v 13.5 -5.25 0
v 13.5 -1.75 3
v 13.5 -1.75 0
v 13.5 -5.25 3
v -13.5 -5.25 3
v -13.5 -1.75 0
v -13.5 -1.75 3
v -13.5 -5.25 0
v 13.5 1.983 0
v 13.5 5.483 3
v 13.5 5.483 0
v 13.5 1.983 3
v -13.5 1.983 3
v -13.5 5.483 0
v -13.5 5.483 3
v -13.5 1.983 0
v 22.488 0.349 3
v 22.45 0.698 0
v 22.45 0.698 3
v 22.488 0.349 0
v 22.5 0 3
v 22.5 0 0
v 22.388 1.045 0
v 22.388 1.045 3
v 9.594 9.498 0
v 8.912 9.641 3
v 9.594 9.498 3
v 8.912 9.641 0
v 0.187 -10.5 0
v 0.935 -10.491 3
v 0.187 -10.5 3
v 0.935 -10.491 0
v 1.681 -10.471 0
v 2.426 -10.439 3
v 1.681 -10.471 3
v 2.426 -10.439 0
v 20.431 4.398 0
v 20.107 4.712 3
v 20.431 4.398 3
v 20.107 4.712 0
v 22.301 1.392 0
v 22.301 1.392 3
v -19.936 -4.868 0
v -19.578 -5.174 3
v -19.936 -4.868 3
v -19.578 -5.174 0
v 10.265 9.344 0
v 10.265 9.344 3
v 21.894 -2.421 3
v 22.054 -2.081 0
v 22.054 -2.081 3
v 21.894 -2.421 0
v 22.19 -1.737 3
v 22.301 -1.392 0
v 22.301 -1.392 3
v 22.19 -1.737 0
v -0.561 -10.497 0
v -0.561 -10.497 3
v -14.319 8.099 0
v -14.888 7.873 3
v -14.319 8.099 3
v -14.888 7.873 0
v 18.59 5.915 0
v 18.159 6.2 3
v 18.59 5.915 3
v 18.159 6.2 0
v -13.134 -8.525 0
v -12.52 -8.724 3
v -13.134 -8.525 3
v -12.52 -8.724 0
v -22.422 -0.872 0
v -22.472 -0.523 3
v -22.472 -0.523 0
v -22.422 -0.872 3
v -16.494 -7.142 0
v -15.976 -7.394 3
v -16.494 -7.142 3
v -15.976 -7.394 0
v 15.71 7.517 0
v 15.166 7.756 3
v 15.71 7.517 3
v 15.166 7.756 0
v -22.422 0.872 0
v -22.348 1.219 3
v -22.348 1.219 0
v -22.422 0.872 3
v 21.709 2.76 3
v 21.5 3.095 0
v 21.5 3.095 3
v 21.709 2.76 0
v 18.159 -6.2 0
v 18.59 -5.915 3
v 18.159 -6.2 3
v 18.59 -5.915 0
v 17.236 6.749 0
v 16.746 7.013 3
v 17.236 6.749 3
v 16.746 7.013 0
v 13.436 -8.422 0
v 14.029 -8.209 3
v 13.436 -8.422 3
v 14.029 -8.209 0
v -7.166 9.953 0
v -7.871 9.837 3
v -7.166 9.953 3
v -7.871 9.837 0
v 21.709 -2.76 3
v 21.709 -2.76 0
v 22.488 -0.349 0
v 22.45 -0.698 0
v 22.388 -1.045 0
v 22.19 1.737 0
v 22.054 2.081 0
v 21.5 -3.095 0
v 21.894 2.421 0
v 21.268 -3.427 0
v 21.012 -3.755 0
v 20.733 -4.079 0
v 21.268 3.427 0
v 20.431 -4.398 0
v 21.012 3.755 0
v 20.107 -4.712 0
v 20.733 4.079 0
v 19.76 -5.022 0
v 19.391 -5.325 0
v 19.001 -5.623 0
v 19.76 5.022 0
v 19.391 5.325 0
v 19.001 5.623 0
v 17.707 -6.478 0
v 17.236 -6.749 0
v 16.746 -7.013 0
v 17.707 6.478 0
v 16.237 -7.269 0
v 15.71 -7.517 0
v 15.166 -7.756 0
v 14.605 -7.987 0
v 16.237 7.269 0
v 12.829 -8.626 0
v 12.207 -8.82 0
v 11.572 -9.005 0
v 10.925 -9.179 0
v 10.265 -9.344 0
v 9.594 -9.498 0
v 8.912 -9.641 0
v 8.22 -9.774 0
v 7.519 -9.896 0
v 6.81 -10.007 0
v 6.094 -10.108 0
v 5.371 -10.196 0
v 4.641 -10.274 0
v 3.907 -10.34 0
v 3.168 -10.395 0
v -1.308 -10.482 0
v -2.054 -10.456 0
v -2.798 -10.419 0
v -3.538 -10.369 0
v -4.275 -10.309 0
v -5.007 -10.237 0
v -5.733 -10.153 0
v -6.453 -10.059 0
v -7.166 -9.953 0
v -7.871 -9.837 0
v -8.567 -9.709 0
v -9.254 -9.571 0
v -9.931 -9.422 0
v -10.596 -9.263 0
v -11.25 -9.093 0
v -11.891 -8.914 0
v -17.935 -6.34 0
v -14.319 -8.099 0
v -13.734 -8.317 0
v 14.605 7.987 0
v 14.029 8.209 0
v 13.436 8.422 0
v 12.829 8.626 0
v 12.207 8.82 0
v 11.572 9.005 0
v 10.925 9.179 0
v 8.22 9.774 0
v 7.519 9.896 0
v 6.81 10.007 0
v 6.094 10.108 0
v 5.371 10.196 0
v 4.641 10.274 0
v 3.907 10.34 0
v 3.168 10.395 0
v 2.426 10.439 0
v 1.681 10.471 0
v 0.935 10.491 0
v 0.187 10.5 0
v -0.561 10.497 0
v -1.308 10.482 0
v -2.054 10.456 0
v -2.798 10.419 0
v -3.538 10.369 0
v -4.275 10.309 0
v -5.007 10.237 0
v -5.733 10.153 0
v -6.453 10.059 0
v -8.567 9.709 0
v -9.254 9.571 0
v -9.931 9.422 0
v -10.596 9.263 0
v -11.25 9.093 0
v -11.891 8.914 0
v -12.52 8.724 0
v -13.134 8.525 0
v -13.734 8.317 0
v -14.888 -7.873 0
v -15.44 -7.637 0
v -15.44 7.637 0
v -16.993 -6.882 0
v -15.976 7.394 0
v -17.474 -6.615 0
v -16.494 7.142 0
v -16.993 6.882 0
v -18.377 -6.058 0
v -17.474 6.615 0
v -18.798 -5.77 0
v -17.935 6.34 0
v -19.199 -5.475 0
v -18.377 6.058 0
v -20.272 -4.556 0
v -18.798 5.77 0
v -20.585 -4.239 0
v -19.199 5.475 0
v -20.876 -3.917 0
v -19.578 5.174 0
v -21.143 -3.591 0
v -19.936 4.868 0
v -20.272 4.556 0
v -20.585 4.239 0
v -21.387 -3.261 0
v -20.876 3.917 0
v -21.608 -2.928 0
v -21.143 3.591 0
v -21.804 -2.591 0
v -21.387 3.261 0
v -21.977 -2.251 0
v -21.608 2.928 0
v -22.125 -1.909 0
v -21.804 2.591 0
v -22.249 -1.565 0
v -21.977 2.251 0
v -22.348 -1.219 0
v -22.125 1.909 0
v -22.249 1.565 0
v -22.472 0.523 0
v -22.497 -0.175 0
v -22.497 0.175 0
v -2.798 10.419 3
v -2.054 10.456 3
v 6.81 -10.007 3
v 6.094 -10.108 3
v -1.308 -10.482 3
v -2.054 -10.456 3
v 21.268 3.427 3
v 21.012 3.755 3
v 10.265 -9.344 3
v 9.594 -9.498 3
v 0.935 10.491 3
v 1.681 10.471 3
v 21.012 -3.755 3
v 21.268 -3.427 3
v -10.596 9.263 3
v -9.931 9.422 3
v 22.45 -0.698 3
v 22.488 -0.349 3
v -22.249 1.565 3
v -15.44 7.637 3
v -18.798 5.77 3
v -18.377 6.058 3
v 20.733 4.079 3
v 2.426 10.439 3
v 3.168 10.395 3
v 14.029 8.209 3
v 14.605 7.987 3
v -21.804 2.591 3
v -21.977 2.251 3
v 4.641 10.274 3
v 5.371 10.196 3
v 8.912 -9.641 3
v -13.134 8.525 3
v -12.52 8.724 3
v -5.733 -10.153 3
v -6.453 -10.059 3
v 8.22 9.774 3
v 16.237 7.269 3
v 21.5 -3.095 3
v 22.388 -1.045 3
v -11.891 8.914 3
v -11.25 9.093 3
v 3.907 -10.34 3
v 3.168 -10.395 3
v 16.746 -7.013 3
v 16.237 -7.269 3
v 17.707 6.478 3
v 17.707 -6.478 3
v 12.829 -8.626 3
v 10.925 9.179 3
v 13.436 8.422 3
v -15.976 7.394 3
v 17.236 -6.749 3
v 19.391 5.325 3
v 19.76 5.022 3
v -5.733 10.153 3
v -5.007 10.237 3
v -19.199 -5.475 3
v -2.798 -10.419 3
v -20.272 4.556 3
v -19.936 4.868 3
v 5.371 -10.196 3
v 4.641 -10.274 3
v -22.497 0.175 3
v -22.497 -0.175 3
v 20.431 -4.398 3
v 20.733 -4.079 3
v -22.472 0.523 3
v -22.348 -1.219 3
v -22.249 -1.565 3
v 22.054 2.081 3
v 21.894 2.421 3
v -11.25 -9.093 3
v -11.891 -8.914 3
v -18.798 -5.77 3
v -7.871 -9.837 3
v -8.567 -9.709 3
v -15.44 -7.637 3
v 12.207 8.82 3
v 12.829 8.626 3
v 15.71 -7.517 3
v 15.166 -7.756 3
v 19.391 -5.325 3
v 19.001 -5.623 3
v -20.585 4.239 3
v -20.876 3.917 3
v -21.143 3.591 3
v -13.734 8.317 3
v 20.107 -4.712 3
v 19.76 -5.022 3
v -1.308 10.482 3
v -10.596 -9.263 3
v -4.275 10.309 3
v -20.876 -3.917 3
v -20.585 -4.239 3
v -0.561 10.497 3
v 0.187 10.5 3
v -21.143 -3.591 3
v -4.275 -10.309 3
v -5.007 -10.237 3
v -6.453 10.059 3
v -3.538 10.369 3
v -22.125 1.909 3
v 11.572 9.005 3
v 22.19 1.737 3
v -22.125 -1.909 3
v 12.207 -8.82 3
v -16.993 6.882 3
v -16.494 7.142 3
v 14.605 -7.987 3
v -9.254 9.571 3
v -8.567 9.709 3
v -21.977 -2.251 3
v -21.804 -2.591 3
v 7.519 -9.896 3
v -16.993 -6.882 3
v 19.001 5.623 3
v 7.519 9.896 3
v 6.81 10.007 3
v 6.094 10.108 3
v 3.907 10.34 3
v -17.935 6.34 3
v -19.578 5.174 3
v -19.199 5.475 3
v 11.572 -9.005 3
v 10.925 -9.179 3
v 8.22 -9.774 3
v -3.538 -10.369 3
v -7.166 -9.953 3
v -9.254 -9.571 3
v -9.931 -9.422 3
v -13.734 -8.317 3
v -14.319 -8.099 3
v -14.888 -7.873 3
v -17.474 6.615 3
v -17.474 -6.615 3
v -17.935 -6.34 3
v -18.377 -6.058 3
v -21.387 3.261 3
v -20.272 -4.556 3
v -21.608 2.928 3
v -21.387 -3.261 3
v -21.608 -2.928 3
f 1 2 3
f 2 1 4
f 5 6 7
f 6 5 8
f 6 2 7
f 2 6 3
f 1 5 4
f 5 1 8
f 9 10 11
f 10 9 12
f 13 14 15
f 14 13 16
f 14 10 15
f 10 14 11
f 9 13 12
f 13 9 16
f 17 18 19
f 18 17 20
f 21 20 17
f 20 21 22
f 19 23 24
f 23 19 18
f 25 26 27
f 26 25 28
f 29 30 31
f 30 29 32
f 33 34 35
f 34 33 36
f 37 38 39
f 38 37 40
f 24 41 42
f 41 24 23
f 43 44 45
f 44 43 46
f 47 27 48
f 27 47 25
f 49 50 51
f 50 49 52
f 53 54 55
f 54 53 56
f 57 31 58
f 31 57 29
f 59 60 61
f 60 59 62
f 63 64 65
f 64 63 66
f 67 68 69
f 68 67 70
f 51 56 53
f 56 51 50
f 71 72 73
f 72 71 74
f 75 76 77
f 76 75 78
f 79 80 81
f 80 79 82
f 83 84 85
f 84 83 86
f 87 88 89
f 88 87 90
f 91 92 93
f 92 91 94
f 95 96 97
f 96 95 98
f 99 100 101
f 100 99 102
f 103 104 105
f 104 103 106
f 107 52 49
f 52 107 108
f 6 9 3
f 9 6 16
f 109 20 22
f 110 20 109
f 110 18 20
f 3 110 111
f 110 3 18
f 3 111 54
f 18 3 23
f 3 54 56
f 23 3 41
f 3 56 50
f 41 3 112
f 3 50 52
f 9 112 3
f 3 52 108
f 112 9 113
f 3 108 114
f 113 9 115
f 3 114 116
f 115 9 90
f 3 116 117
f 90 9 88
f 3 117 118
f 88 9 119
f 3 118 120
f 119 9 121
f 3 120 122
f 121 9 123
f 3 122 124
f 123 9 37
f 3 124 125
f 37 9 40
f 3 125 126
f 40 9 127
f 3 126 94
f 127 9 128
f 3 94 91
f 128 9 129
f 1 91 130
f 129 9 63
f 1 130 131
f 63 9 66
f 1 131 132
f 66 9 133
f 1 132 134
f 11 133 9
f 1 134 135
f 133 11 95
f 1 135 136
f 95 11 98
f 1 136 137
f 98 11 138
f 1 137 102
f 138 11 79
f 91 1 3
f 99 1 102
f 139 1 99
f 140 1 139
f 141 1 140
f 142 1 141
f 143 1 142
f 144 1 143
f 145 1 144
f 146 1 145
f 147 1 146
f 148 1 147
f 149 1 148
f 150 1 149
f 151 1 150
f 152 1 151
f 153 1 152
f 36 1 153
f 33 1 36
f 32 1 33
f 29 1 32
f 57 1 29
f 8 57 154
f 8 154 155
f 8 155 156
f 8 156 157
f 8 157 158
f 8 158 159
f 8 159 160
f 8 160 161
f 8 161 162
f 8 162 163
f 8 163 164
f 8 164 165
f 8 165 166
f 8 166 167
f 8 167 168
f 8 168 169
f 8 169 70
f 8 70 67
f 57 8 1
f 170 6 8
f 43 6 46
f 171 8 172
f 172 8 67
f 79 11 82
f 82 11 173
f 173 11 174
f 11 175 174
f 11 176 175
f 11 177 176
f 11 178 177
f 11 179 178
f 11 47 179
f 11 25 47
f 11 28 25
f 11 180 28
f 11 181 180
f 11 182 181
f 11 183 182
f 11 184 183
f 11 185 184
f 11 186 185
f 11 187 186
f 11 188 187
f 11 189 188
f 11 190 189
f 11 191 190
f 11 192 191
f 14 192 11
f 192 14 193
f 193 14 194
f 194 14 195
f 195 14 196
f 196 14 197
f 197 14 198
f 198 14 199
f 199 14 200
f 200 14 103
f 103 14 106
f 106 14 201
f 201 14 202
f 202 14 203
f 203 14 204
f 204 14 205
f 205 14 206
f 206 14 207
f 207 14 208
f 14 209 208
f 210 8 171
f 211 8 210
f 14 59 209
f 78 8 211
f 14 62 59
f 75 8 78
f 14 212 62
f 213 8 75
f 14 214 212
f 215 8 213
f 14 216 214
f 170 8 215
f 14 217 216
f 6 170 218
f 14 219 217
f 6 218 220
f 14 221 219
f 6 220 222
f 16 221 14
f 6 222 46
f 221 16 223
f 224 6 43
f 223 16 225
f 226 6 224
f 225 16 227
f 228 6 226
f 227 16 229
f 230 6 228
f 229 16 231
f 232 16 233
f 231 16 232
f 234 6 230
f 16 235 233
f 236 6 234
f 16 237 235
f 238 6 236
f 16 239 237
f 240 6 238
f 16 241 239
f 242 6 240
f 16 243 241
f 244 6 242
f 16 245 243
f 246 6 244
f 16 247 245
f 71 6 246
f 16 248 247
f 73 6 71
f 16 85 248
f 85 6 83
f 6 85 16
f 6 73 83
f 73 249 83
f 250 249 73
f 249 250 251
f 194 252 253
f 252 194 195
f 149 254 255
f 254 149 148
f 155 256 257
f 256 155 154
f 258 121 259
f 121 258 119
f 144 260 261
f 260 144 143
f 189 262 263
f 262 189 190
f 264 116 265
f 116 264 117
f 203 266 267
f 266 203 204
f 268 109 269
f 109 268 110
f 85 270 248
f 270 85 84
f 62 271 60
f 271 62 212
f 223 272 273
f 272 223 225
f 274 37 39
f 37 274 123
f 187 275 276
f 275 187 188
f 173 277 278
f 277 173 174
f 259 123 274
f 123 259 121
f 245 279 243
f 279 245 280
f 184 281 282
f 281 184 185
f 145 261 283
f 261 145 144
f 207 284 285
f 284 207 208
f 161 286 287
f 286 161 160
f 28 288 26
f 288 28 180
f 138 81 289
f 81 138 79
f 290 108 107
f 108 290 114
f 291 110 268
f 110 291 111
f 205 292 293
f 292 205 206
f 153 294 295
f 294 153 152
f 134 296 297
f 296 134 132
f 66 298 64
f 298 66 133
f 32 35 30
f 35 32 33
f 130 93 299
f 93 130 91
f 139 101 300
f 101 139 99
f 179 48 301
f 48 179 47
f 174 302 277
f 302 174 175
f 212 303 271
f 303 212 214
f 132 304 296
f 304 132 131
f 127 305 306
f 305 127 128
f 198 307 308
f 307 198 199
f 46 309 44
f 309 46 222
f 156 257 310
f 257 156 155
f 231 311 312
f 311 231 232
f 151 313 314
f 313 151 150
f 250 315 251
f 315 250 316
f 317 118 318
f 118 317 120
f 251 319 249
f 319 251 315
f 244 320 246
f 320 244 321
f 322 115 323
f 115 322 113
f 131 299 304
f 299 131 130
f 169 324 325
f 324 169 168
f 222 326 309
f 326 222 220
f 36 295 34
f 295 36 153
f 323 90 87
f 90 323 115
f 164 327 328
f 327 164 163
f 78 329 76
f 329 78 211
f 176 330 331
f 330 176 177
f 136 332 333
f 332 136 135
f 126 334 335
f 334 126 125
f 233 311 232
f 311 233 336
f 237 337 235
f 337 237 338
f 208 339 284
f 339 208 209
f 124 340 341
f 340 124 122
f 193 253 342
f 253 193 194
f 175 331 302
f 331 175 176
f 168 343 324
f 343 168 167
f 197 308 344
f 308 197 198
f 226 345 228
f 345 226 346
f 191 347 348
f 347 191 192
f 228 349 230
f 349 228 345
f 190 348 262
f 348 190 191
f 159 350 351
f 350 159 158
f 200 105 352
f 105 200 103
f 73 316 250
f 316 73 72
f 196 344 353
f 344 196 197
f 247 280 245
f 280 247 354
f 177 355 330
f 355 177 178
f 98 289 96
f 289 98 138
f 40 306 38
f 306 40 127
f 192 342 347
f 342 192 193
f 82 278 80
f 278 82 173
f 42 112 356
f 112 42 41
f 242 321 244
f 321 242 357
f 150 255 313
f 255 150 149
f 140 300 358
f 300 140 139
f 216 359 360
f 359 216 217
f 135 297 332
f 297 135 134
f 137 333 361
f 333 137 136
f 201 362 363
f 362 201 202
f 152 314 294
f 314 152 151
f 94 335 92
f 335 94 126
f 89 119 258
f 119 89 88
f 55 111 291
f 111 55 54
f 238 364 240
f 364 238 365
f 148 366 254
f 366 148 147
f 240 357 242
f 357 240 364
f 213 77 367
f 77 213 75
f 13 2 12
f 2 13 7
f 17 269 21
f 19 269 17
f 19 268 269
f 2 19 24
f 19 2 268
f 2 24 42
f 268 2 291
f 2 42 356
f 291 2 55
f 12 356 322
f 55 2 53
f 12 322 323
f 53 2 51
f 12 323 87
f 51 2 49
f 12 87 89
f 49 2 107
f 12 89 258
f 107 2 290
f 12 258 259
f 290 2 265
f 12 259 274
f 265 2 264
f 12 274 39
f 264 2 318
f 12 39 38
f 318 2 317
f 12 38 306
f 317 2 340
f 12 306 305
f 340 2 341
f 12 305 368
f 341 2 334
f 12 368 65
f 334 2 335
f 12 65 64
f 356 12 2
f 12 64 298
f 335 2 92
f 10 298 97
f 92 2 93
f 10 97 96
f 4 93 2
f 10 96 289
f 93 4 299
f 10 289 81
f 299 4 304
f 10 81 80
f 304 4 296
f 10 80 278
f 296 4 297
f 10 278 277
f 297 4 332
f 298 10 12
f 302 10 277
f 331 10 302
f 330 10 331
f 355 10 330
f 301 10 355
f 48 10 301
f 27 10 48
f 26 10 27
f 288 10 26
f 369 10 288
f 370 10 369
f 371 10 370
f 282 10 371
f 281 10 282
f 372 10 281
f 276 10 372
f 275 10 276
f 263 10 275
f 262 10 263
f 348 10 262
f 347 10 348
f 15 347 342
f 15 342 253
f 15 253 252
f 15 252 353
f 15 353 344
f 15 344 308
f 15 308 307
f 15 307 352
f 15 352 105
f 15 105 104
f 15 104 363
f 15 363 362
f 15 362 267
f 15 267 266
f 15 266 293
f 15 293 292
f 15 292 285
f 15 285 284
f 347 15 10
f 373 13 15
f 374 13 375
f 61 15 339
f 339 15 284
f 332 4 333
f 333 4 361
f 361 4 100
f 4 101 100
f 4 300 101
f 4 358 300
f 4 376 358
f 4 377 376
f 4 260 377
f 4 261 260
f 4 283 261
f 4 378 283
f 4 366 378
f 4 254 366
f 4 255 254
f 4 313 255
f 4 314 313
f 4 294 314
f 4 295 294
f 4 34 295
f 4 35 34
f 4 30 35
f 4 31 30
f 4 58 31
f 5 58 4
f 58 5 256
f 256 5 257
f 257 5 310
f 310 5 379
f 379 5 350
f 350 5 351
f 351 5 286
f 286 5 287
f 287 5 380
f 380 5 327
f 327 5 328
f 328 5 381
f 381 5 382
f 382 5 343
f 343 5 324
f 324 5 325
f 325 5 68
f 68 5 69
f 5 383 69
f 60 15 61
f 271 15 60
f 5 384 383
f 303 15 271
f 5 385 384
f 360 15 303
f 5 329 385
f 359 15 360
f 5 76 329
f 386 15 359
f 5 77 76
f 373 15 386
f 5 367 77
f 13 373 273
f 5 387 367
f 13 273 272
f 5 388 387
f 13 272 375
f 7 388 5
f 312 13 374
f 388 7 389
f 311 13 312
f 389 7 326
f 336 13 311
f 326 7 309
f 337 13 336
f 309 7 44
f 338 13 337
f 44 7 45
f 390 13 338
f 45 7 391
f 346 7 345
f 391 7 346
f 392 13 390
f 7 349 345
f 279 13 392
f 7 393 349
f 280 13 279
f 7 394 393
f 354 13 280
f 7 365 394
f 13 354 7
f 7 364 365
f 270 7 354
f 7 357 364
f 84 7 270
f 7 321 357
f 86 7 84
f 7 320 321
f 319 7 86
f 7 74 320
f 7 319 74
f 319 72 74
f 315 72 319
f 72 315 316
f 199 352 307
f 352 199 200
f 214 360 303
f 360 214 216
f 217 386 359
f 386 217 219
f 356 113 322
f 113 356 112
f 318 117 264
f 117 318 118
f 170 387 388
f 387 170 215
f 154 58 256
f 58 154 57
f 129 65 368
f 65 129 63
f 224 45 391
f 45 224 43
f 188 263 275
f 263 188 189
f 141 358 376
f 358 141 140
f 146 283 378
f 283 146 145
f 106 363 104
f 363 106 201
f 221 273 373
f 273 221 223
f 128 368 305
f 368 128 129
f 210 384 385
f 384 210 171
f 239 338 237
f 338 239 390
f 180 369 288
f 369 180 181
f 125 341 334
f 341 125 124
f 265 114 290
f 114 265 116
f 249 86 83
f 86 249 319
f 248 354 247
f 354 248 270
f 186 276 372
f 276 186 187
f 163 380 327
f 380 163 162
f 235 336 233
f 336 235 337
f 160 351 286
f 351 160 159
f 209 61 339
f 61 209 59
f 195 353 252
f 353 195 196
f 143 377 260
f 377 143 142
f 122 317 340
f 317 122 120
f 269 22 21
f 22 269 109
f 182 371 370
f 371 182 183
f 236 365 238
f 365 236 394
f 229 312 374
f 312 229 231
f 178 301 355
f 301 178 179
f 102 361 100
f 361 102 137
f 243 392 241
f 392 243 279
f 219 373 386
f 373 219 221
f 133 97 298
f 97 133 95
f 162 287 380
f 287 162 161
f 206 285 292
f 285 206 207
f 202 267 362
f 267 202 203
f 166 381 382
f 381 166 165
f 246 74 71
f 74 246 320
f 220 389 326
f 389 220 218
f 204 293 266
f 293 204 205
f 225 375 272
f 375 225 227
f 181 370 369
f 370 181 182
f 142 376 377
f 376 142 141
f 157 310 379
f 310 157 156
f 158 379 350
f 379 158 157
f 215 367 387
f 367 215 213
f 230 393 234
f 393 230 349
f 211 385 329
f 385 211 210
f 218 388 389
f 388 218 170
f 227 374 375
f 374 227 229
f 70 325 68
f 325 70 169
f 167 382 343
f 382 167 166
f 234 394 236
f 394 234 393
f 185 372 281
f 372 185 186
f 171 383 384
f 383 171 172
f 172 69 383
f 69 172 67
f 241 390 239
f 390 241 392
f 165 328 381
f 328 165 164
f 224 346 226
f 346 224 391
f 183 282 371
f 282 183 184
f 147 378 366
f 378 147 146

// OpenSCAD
$fs=0.35; $fa=1;
tol = 0.01;

ox = 45/2;
oy = 21/2;

sloty = 3.5;
slotx = 27;

yoff = (oy-sloty*2)/3;

thick = 3;

difference() {
  scale([ox/oy,1,1]) cylinder(r=oy, h=thick);
  translate([ -(ox-slotx/2)*1.5,-yoff*1.5-sloty,-tol]){
    cube([slotx,sloty,thick+tol*2]);
    translate([0,sloty+yoff*3.2])
      cube([slotx,sloty,thick+tol*2]);
  }
}
